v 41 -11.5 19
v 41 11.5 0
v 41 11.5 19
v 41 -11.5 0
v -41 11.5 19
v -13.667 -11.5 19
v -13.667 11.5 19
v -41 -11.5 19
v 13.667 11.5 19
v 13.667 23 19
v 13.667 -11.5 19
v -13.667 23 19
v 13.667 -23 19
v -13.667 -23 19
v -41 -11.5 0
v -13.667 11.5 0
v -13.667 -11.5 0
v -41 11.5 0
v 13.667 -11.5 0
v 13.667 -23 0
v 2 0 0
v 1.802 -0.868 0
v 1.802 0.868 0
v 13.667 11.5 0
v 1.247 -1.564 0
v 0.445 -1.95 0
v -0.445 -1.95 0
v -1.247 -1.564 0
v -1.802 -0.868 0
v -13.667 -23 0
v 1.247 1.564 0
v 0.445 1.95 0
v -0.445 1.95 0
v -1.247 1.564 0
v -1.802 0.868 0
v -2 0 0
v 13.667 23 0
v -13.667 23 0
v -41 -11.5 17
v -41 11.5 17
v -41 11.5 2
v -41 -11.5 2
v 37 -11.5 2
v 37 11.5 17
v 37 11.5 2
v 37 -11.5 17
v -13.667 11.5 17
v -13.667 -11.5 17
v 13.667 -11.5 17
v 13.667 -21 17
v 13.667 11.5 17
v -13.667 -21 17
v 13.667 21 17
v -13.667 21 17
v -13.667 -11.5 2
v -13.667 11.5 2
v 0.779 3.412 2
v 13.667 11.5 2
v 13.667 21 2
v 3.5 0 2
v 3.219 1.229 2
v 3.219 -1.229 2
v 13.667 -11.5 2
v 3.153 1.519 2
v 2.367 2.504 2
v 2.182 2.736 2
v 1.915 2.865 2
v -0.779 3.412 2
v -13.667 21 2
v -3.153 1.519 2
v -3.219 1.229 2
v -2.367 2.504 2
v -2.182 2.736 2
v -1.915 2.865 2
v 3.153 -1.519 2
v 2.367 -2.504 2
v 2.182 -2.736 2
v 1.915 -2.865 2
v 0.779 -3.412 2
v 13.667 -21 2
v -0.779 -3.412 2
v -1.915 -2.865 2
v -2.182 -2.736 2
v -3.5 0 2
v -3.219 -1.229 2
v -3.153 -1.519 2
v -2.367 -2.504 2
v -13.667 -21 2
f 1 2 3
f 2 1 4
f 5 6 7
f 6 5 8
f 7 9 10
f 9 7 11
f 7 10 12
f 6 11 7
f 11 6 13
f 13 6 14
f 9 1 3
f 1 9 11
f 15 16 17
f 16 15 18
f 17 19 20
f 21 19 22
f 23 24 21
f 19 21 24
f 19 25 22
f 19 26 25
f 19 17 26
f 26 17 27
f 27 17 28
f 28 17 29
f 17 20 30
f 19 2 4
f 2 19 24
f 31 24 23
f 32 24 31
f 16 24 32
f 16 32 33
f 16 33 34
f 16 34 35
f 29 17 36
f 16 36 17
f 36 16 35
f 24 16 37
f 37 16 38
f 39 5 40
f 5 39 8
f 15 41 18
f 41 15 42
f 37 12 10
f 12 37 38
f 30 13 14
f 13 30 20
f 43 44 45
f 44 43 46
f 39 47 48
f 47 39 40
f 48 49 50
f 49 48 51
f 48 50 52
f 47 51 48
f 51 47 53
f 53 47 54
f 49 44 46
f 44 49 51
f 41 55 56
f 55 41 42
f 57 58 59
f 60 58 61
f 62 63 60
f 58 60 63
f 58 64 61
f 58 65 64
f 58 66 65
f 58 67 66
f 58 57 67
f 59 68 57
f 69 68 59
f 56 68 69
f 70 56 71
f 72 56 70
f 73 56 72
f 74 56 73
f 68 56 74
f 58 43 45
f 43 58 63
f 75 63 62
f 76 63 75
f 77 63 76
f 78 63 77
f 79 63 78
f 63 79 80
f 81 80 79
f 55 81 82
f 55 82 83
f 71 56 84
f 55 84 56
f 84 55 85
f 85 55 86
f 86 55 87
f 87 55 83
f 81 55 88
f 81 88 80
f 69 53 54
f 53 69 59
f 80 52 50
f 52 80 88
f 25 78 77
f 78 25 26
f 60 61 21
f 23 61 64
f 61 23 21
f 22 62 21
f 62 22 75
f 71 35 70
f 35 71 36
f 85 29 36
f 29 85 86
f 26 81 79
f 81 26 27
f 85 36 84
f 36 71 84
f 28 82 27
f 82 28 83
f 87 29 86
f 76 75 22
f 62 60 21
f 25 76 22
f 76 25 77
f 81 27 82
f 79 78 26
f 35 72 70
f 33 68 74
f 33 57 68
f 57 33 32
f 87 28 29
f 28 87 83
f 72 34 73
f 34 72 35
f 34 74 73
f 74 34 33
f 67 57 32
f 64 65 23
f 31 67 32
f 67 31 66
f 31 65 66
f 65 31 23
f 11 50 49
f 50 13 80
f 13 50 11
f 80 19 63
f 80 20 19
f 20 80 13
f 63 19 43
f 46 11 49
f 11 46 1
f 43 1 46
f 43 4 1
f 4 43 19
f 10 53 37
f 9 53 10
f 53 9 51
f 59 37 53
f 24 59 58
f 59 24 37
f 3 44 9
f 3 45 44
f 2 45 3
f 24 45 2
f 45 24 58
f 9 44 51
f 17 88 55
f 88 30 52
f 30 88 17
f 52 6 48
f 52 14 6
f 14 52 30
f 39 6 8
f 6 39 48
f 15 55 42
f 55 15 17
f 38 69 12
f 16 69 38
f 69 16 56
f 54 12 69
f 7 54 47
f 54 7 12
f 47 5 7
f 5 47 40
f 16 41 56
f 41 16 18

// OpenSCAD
// To use it, uncomment
remote_holder ();

module remote_holder ()
{
    height = 19  ;
    length = 82 ;
    width= 46 ;
    half_width  = width / 2;
    
    borders = 2; // 1 cm on each side

    top_cube_length = length - 2 * borders;
    top_cube_width  = width - 2 * borders;
    top_cube_height = height - 2 * borders;  // make it big enough
    top_z = height/2 ; // adjust manually ;)

    tip_cut_pos = length/2 - 0.5;

    difference() {
	translate ([-length/2.0, -width/2, 0]) {
    	    cube ([length, width, height]);
	}

	// top inset
	translate ([-1 * borders, 0, top_z]) {
	    # cube ([top_cube_length,
		     top_cube_width,
		     top_cube_height],
		    center=true) ;
	}
    
    
	translate ([-length/2.0, width/2, height]) {
    	   # polyhedron (	
	    		points = [[0, 0, 0], [0,-1.5*borders, -borders], [0,-width + 1.5*borders,-borders],[0,-width,0], [length - 4*borders, 0, 0], [length - 4*borders,-1.5*borders, -borders], [length - 4*borders,-width + 1.5*borders,-borders],[length - 4*borders,-width,0]],
                faces = [[0,1,2,3], [1,5,4,0], [4,5,6,7], [3,7,6,2], [0,3,7,4], [1,2,6,5]]);
	}
    
    	translate ([0,0,0]) {
    	   # cylinder (3, 2,4.25);
	}
    
    translate ([length/6.0,-width/2,0]) {
        # cube ([length/3, width/4,height]);
	}
    
    translate ([length/6.0,width/4,0]) {
        # cube ([length/3, width/4,height]);
	}
        
    translate ([-length/2.0,-width/2,0]) {
        # cube ([length/3, width/4,height]);
	}
    
    translate ([-length/2.0,width/4,0]) {
        # cube ([length/3, width/4,height]);
	}
    }
    
}
